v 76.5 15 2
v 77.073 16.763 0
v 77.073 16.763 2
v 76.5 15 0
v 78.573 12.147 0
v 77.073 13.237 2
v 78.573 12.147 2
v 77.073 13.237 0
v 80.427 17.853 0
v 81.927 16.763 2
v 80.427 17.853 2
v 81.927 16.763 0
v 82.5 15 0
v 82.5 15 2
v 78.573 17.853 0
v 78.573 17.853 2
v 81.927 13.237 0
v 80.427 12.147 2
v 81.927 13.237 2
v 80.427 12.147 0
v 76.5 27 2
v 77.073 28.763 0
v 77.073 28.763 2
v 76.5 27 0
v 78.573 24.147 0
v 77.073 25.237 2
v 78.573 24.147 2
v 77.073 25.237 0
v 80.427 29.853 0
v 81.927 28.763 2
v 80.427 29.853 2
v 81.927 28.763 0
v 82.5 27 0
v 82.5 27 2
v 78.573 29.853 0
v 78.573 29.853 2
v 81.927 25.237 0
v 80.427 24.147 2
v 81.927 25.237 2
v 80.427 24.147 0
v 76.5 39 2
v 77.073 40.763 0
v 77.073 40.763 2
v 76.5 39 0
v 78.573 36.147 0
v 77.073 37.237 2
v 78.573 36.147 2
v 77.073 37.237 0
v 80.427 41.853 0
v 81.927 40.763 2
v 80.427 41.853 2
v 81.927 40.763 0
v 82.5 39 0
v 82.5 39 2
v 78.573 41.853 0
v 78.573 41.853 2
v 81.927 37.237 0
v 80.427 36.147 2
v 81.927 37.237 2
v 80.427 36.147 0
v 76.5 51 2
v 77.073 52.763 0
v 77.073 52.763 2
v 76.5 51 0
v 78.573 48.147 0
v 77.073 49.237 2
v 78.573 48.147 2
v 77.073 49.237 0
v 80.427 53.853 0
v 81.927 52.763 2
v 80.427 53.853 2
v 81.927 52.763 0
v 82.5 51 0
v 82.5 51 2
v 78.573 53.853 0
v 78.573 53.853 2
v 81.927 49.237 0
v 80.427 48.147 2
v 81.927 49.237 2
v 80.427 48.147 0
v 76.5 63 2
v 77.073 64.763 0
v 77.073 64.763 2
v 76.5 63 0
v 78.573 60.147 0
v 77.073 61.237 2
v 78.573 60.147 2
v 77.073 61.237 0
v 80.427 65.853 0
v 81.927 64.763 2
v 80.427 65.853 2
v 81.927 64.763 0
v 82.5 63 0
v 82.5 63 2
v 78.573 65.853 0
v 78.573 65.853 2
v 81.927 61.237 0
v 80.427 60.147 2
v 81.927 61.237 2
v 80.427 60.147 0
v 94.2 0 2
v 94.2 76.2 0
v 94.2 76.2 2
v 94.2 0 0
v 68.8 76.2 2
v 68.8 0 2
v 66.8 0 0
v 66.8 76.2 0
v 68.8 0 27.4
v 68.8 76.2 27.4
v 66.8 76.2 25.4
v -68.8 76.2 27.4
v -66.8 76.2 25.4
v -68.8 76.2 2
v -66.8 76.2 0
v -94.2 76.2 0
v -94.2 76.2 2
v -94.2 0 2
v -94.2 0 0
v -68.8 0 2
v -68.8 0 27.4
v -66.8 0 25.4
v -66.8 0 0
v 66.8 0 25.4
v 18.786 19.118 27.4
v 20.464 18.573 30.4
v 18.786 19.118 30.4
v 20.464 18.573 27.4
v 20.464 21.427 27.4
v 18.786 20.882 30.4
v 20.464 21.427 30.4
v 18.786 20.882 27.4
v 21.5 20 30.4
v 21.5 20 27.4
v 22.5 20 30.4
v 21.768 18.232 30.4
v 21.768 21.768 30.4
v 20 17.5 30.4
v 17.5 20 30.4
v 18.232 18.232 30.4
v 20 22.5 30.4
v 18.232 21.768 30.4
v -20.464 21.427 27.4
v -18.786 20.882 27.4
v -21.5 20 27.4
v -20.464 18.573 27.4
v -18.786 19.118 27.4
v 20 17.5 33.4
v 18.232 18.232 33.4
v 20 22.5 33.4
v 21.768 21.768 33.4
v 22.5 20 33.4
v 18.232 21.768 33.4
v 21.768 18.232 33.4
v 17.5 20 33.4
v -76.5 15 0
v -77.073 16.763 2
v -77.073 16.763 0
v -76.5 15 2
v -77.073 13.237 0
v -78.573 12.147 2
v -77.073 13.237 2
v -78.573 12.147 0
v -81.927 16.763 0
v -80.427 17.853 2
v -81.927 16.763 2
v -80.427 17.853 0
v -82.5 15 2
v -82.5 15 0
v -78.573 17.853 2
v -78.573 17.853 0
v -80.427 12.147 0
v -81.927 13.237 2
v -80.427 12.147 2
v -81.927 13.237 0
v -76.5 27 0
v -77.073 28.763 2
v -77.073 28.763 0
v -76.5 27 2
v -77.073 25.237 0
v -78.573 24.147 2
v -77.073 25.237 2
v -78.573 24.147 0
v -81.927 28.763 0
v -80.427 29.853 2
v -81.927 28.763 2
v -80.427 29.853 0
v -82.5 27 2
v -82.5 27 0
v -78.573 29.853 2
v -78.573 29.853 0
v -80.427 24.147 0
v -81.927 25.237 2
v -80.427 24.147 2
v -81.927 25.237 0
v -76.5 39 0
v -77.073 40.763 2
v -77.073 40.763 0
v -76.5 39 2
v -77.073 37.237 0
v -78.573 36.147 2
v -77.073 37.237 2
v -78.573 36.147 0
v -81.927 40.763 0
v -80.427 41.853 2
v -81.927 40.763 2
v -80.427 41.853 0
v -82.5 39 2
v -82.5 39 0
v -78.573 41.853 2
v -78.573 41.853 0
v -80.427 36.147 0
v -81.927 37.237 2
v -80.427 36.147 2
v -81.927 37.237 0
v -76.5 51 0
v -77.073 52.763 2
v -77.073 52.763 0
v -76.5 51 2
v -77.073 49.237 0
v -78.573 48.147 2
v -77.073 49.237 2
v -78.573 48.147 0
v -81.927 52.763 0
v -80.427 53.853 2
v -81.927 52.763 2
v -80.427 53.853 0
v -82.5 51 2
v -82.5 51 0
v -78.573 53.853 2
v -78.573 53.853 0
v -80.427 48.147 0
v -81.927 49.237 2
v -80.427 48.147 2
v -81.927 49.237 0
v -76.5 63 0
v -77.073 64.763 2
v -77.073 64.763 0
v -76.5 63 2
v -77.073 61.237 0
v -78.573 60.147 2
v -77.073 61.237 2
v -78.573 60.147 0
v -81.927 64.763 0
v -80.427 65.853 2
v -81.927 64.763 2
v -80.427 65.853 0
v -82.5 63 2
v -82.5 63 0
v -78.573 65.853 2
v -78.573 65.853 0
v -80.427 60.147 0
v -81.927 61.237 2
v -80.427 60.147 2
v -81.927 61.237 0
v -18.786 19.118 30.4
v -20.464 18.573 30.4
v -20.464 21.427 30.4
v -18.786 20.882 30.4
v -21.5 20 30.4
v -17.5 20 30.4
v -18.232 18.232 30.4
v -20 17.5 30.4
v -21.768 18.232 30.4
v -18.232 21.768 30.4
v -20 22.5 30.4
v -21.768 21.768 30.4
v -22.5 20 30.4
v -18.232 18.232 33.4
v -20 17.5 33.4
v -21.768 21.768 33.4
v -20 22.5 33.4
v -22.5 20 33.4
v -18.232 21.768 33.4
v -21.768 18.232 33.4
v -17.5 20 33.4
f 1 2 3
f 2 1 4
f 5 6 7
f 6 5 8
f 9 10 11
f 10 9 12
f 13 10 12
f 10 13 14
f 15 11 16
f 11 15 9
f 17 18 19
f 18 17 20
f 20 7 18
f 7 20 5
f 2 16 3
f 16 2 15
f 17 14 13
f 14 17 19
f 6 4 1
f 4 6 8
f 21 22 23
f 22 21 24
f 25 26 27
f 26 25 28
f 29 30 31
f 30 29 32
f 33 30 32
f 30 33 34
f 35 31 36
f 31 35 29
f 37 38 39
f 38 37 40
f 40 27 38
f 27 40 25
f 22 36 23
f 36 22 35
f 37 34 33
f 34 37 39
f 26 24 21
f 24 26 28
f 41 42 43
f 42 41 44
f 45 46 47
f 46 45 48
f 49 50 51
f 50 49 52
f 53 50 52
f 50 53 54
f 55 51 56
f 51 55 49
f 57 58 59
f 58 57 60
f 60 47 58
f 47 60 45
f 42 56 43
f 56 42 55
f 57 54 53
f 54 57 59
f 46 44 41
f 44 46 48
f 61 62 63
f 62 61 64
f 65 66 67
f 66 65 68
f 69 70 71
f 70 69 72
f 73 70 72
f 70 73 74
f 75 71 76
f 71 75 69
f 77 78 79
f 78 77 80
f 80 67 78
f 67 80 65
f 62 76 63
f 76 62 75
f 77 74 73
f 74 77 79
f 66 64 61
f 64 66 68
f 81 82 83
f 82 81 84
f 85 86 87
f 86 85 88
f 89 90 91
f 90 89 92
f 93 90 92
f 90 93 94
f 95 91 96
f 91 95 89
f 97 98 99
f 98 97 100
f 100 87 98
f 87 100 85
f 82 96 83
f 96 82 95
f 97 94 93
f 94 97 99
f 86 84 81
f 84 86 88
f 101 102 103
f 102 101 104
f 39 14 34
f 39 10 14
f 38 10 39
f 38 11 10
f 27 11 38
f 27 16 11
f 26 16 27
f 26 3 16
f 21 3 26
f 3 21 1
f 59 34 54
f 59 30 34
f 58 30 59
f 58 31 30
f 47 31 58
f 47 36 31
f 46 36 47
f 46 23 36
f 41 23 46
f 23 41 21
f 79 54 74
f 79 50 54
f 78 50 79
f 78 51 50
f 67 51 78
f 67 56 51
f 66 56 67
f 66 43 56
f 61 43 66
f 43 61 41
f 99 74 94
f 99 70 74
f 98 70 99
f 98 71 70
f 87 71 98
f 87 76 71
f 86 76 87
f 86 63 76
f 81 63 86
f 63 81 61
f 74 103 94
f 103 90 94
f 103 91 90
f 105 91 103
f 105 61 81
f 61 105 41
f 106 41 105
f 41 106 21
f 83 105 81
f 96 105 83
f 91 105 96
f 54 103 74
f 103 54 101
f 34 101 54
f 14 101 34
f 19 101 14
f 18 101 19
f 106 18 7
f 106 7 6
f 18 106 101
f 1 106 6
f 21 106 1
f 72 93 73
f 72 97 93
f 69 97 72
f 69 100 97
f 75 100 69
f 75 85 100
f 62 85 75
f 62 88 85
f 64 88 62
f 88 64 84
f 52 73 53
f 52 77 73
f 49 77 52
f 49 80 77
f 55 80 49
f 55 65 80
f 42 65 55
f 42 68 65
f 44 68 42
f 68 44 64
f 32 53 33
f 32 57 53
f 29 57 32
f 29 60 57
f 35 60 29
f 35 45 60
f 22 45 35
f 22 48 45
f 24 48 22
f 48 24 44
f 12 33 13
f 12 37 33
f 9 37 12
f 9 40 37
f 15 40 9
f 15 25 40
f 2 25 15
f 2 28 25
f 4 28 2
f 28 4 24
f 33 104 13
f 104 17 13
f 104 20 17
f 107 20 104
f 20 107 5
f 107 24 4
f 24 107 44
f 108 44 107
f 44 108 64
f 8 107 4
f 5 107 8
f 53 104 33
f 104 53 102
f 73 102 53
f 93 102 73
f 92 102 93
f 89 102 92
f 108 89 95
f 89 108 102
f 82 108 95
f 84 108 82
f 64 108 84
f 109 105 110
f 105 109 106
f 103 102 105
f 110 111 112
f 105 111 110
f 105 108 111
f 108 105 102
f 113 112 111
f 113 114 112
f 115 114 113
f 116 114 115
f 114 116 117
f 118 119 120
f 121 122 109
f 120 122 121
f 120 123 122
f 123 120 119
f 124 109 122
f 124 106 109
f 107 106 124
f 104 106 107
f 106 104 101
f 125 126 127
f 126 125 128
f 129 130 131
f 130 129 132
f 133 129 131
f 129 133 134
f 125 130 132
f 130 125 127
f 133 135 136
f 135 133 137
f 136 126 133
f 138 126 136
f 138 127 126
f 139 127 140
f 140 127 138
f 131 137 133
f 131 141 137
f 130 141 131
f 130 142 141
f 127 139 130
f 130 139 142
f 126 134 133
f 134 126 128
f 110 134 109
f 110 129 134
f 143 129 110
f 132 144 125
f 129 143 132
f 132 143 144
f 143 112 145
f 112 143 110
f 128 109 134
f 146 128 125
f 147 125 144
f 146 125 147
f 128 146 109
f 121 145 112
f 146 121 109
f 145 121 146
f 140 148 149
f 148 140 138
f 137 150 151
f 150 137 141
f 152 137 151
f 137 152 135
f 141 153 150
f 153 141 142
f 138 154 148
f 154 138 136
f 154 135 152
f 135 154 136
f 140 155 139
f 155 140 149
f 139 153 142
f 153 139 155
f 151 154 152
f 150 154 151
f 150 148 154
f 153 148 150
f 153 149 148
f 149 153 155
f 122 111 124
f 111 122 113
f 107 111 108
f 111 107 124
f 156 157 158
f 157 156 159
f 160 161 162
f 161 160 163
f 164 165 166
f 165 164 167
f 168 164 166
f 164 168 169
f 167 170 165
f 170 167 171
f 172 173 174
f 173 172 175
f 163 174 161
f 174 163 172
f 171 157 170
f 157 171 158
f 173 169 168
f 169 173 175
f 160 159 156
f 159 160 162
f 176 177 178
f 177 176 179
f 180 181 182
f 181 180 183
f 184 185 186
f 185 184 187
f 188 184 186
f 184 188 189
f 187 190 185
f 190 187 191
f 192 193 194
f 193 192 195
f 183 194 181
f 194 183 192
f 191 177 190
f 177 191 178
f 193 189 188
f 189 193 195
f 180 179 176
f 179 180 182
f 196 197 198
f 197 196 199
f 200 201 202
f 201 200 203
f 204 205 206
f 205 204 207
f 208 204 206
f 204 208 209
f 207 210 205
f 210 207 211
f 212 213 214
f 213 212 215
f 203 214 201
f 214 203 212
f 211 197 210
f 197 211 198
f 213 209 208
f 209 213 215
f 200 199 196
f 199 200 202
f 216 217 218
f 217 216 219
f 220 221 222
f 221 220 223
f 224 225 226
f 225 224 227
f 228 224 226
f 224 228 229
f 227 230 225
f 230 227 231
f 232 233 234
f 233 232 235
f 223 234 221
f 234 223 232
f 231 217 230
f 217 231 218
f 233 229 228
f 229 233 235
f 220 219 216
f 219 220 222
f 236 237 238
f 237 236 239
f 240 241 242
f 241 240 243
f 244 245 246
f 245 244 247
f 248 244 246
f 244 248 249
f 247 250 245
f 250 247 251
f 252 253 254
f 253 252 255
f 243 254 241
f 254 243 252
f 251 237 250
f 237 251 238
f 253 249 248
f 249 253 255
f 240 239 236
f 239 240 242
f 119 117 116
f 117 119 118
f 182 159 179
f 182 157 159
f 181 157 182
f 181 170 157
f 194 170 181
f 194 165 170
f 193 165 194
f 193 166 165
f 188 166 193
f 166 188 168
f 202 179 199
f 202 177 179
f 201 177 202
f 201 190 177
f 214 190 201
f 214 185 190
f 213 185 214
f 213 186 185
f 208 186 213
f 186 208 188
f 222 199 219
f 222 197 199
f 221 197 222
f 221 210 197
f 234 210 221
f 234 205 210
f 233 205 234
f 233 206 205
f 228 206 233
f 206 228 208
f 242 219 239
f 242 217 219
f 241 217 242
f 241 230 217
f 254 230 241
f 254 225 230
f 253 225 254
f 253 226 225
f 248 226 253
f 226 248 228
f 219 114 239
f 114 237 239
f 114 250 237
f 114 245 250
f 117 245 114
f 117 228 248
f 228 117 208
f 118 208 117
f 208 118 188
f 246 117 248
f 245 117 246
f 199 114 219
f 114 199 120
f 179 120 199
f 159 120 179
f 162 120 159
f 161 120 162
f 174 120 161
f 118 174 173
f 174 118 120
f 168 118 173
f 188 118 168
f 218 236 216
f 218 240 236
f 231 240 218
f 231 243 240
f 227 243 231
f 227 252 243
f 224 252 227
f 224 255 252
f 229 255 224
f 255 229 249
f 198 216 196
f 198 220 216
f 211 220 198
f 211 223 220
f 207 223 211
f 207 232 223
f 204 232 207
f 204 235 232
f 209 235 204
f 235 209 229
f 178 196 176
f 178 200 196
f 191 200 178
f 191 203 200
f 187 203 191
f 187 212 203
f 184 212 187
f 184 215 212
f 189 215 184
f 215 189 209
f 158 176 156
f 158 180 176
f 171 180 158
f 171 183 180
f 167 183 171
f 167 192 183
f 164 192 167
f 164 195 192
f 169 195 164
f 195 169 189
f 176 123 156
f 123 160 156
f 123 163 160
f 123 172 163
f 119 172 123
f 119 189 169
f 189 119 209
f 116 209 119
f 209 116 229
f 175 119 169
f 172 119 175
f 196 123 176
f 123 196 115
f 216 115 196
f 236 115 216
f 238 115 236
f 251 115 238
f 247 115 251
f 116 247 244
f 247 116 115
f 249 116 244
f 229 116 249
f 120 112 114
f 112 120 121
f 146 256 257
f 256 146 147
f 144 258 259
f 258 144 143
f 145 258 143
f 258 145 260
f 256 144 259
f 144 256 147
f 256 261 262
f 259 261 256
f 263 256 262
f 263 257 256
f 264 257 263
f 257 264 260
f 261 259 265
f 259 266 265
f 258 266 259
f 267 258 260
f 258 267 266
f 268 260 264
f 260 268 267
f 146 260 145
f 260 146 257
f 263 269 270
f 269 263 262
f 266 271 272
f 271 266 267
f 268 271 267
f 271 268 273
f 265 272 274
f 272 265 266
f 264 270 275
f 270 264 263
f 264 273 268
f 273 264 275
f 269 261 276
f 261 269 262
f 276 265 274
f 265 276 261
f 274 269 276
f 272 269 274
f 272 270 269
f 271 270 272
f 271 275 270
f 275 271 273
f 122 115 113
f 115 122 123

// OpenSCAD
// Trying to build icc device v2
// All measurements are in mm

// Wall Thickness
WallThickness = 2;

// Base dimensions
TopWidth = 163;   // [163:168]
TopDepth = 76.2;  // [35:77] 
TopHeight = 25.4;  //  [0:100]  

// Support
SupportWidth = 25.4;
SupportDepth = TopDepth;
SupportHeight = 2;

// Using mirroring we need half of this
HalfWidth = (TopWidth-SupportWidth)/2;

// Ragardless of Width & Depth the holes must always be
// 12mm apart (on centre) with a hole size of 6mm
// 153mm apart (on centre)

// Support Holes
SupportHoleRadius = 3;
SupportX = 153;
SupportY = 12;

// Studs
StudX = 20;
StudY = 20;
StudNeckHeight=3;  // [1:10]
StudNeckRadius=1.5; // [0.5:15]
StudCapHeight=3;  // [0.5:10]
StudCapRadius=2.5;  // [0.5:15]

// Modules

module Support() {
    
    union() {
        
        difference() {
            
            // Support
            translate([HalfWidth, 0, 0])
            cube([SupportWidth,SupportDepth,SupportHeight]);
               
            // Holes
            x_offset=(SupportX/2)+SupportHoleRadius;
            y_first=SupportY+SupportHoleRadius;

            for (a=[y_first:SupportY:SupportDepth]) {
                
                if( a < SupportDepth-(SupportHoleRadius*2) ) {
                    echo(a);
                    translate([x_offset, a, +1])
                    cylinder(h=SupportHeight+2, r=SupportHoleRadius, center=true);
                }
                
            }
            
        }
        
    }  
    
}


module Top() {

    translate([0, 0, TopHeight])
    cube([HalfWidth, TopDepth, WallThickness]);

}

module Side() {
    
    // Overlap the top by wall thickness
    translate([HalfWidth-WallThickness, 0, 0])
    cube([WallThickness, TopDepth, TopHeight]);
}

module Stud () {
        
    // Neck
    translate( [StudX, StudY, TopHeight+WallThickness+(StudCapHeight/2)] )
    cylinder(h=StudNeckHeight, r=StudNeckRadius, center=true);
    
    // Cap
    translate( [StudX, StudY, TopHeight+WallThickness+StudNeckHeight+(StudCapHeight/2)] )
    cylinder(h=StudCapHeight, r=StudCapRadius, center=true);
}


// Main

union() {
    Top();
    Side();
    Support();
    Stud();
}
mirror([1,0,0])
union() {
    Top();
    Side();
    Support();
    Stud();
}



/* END */
